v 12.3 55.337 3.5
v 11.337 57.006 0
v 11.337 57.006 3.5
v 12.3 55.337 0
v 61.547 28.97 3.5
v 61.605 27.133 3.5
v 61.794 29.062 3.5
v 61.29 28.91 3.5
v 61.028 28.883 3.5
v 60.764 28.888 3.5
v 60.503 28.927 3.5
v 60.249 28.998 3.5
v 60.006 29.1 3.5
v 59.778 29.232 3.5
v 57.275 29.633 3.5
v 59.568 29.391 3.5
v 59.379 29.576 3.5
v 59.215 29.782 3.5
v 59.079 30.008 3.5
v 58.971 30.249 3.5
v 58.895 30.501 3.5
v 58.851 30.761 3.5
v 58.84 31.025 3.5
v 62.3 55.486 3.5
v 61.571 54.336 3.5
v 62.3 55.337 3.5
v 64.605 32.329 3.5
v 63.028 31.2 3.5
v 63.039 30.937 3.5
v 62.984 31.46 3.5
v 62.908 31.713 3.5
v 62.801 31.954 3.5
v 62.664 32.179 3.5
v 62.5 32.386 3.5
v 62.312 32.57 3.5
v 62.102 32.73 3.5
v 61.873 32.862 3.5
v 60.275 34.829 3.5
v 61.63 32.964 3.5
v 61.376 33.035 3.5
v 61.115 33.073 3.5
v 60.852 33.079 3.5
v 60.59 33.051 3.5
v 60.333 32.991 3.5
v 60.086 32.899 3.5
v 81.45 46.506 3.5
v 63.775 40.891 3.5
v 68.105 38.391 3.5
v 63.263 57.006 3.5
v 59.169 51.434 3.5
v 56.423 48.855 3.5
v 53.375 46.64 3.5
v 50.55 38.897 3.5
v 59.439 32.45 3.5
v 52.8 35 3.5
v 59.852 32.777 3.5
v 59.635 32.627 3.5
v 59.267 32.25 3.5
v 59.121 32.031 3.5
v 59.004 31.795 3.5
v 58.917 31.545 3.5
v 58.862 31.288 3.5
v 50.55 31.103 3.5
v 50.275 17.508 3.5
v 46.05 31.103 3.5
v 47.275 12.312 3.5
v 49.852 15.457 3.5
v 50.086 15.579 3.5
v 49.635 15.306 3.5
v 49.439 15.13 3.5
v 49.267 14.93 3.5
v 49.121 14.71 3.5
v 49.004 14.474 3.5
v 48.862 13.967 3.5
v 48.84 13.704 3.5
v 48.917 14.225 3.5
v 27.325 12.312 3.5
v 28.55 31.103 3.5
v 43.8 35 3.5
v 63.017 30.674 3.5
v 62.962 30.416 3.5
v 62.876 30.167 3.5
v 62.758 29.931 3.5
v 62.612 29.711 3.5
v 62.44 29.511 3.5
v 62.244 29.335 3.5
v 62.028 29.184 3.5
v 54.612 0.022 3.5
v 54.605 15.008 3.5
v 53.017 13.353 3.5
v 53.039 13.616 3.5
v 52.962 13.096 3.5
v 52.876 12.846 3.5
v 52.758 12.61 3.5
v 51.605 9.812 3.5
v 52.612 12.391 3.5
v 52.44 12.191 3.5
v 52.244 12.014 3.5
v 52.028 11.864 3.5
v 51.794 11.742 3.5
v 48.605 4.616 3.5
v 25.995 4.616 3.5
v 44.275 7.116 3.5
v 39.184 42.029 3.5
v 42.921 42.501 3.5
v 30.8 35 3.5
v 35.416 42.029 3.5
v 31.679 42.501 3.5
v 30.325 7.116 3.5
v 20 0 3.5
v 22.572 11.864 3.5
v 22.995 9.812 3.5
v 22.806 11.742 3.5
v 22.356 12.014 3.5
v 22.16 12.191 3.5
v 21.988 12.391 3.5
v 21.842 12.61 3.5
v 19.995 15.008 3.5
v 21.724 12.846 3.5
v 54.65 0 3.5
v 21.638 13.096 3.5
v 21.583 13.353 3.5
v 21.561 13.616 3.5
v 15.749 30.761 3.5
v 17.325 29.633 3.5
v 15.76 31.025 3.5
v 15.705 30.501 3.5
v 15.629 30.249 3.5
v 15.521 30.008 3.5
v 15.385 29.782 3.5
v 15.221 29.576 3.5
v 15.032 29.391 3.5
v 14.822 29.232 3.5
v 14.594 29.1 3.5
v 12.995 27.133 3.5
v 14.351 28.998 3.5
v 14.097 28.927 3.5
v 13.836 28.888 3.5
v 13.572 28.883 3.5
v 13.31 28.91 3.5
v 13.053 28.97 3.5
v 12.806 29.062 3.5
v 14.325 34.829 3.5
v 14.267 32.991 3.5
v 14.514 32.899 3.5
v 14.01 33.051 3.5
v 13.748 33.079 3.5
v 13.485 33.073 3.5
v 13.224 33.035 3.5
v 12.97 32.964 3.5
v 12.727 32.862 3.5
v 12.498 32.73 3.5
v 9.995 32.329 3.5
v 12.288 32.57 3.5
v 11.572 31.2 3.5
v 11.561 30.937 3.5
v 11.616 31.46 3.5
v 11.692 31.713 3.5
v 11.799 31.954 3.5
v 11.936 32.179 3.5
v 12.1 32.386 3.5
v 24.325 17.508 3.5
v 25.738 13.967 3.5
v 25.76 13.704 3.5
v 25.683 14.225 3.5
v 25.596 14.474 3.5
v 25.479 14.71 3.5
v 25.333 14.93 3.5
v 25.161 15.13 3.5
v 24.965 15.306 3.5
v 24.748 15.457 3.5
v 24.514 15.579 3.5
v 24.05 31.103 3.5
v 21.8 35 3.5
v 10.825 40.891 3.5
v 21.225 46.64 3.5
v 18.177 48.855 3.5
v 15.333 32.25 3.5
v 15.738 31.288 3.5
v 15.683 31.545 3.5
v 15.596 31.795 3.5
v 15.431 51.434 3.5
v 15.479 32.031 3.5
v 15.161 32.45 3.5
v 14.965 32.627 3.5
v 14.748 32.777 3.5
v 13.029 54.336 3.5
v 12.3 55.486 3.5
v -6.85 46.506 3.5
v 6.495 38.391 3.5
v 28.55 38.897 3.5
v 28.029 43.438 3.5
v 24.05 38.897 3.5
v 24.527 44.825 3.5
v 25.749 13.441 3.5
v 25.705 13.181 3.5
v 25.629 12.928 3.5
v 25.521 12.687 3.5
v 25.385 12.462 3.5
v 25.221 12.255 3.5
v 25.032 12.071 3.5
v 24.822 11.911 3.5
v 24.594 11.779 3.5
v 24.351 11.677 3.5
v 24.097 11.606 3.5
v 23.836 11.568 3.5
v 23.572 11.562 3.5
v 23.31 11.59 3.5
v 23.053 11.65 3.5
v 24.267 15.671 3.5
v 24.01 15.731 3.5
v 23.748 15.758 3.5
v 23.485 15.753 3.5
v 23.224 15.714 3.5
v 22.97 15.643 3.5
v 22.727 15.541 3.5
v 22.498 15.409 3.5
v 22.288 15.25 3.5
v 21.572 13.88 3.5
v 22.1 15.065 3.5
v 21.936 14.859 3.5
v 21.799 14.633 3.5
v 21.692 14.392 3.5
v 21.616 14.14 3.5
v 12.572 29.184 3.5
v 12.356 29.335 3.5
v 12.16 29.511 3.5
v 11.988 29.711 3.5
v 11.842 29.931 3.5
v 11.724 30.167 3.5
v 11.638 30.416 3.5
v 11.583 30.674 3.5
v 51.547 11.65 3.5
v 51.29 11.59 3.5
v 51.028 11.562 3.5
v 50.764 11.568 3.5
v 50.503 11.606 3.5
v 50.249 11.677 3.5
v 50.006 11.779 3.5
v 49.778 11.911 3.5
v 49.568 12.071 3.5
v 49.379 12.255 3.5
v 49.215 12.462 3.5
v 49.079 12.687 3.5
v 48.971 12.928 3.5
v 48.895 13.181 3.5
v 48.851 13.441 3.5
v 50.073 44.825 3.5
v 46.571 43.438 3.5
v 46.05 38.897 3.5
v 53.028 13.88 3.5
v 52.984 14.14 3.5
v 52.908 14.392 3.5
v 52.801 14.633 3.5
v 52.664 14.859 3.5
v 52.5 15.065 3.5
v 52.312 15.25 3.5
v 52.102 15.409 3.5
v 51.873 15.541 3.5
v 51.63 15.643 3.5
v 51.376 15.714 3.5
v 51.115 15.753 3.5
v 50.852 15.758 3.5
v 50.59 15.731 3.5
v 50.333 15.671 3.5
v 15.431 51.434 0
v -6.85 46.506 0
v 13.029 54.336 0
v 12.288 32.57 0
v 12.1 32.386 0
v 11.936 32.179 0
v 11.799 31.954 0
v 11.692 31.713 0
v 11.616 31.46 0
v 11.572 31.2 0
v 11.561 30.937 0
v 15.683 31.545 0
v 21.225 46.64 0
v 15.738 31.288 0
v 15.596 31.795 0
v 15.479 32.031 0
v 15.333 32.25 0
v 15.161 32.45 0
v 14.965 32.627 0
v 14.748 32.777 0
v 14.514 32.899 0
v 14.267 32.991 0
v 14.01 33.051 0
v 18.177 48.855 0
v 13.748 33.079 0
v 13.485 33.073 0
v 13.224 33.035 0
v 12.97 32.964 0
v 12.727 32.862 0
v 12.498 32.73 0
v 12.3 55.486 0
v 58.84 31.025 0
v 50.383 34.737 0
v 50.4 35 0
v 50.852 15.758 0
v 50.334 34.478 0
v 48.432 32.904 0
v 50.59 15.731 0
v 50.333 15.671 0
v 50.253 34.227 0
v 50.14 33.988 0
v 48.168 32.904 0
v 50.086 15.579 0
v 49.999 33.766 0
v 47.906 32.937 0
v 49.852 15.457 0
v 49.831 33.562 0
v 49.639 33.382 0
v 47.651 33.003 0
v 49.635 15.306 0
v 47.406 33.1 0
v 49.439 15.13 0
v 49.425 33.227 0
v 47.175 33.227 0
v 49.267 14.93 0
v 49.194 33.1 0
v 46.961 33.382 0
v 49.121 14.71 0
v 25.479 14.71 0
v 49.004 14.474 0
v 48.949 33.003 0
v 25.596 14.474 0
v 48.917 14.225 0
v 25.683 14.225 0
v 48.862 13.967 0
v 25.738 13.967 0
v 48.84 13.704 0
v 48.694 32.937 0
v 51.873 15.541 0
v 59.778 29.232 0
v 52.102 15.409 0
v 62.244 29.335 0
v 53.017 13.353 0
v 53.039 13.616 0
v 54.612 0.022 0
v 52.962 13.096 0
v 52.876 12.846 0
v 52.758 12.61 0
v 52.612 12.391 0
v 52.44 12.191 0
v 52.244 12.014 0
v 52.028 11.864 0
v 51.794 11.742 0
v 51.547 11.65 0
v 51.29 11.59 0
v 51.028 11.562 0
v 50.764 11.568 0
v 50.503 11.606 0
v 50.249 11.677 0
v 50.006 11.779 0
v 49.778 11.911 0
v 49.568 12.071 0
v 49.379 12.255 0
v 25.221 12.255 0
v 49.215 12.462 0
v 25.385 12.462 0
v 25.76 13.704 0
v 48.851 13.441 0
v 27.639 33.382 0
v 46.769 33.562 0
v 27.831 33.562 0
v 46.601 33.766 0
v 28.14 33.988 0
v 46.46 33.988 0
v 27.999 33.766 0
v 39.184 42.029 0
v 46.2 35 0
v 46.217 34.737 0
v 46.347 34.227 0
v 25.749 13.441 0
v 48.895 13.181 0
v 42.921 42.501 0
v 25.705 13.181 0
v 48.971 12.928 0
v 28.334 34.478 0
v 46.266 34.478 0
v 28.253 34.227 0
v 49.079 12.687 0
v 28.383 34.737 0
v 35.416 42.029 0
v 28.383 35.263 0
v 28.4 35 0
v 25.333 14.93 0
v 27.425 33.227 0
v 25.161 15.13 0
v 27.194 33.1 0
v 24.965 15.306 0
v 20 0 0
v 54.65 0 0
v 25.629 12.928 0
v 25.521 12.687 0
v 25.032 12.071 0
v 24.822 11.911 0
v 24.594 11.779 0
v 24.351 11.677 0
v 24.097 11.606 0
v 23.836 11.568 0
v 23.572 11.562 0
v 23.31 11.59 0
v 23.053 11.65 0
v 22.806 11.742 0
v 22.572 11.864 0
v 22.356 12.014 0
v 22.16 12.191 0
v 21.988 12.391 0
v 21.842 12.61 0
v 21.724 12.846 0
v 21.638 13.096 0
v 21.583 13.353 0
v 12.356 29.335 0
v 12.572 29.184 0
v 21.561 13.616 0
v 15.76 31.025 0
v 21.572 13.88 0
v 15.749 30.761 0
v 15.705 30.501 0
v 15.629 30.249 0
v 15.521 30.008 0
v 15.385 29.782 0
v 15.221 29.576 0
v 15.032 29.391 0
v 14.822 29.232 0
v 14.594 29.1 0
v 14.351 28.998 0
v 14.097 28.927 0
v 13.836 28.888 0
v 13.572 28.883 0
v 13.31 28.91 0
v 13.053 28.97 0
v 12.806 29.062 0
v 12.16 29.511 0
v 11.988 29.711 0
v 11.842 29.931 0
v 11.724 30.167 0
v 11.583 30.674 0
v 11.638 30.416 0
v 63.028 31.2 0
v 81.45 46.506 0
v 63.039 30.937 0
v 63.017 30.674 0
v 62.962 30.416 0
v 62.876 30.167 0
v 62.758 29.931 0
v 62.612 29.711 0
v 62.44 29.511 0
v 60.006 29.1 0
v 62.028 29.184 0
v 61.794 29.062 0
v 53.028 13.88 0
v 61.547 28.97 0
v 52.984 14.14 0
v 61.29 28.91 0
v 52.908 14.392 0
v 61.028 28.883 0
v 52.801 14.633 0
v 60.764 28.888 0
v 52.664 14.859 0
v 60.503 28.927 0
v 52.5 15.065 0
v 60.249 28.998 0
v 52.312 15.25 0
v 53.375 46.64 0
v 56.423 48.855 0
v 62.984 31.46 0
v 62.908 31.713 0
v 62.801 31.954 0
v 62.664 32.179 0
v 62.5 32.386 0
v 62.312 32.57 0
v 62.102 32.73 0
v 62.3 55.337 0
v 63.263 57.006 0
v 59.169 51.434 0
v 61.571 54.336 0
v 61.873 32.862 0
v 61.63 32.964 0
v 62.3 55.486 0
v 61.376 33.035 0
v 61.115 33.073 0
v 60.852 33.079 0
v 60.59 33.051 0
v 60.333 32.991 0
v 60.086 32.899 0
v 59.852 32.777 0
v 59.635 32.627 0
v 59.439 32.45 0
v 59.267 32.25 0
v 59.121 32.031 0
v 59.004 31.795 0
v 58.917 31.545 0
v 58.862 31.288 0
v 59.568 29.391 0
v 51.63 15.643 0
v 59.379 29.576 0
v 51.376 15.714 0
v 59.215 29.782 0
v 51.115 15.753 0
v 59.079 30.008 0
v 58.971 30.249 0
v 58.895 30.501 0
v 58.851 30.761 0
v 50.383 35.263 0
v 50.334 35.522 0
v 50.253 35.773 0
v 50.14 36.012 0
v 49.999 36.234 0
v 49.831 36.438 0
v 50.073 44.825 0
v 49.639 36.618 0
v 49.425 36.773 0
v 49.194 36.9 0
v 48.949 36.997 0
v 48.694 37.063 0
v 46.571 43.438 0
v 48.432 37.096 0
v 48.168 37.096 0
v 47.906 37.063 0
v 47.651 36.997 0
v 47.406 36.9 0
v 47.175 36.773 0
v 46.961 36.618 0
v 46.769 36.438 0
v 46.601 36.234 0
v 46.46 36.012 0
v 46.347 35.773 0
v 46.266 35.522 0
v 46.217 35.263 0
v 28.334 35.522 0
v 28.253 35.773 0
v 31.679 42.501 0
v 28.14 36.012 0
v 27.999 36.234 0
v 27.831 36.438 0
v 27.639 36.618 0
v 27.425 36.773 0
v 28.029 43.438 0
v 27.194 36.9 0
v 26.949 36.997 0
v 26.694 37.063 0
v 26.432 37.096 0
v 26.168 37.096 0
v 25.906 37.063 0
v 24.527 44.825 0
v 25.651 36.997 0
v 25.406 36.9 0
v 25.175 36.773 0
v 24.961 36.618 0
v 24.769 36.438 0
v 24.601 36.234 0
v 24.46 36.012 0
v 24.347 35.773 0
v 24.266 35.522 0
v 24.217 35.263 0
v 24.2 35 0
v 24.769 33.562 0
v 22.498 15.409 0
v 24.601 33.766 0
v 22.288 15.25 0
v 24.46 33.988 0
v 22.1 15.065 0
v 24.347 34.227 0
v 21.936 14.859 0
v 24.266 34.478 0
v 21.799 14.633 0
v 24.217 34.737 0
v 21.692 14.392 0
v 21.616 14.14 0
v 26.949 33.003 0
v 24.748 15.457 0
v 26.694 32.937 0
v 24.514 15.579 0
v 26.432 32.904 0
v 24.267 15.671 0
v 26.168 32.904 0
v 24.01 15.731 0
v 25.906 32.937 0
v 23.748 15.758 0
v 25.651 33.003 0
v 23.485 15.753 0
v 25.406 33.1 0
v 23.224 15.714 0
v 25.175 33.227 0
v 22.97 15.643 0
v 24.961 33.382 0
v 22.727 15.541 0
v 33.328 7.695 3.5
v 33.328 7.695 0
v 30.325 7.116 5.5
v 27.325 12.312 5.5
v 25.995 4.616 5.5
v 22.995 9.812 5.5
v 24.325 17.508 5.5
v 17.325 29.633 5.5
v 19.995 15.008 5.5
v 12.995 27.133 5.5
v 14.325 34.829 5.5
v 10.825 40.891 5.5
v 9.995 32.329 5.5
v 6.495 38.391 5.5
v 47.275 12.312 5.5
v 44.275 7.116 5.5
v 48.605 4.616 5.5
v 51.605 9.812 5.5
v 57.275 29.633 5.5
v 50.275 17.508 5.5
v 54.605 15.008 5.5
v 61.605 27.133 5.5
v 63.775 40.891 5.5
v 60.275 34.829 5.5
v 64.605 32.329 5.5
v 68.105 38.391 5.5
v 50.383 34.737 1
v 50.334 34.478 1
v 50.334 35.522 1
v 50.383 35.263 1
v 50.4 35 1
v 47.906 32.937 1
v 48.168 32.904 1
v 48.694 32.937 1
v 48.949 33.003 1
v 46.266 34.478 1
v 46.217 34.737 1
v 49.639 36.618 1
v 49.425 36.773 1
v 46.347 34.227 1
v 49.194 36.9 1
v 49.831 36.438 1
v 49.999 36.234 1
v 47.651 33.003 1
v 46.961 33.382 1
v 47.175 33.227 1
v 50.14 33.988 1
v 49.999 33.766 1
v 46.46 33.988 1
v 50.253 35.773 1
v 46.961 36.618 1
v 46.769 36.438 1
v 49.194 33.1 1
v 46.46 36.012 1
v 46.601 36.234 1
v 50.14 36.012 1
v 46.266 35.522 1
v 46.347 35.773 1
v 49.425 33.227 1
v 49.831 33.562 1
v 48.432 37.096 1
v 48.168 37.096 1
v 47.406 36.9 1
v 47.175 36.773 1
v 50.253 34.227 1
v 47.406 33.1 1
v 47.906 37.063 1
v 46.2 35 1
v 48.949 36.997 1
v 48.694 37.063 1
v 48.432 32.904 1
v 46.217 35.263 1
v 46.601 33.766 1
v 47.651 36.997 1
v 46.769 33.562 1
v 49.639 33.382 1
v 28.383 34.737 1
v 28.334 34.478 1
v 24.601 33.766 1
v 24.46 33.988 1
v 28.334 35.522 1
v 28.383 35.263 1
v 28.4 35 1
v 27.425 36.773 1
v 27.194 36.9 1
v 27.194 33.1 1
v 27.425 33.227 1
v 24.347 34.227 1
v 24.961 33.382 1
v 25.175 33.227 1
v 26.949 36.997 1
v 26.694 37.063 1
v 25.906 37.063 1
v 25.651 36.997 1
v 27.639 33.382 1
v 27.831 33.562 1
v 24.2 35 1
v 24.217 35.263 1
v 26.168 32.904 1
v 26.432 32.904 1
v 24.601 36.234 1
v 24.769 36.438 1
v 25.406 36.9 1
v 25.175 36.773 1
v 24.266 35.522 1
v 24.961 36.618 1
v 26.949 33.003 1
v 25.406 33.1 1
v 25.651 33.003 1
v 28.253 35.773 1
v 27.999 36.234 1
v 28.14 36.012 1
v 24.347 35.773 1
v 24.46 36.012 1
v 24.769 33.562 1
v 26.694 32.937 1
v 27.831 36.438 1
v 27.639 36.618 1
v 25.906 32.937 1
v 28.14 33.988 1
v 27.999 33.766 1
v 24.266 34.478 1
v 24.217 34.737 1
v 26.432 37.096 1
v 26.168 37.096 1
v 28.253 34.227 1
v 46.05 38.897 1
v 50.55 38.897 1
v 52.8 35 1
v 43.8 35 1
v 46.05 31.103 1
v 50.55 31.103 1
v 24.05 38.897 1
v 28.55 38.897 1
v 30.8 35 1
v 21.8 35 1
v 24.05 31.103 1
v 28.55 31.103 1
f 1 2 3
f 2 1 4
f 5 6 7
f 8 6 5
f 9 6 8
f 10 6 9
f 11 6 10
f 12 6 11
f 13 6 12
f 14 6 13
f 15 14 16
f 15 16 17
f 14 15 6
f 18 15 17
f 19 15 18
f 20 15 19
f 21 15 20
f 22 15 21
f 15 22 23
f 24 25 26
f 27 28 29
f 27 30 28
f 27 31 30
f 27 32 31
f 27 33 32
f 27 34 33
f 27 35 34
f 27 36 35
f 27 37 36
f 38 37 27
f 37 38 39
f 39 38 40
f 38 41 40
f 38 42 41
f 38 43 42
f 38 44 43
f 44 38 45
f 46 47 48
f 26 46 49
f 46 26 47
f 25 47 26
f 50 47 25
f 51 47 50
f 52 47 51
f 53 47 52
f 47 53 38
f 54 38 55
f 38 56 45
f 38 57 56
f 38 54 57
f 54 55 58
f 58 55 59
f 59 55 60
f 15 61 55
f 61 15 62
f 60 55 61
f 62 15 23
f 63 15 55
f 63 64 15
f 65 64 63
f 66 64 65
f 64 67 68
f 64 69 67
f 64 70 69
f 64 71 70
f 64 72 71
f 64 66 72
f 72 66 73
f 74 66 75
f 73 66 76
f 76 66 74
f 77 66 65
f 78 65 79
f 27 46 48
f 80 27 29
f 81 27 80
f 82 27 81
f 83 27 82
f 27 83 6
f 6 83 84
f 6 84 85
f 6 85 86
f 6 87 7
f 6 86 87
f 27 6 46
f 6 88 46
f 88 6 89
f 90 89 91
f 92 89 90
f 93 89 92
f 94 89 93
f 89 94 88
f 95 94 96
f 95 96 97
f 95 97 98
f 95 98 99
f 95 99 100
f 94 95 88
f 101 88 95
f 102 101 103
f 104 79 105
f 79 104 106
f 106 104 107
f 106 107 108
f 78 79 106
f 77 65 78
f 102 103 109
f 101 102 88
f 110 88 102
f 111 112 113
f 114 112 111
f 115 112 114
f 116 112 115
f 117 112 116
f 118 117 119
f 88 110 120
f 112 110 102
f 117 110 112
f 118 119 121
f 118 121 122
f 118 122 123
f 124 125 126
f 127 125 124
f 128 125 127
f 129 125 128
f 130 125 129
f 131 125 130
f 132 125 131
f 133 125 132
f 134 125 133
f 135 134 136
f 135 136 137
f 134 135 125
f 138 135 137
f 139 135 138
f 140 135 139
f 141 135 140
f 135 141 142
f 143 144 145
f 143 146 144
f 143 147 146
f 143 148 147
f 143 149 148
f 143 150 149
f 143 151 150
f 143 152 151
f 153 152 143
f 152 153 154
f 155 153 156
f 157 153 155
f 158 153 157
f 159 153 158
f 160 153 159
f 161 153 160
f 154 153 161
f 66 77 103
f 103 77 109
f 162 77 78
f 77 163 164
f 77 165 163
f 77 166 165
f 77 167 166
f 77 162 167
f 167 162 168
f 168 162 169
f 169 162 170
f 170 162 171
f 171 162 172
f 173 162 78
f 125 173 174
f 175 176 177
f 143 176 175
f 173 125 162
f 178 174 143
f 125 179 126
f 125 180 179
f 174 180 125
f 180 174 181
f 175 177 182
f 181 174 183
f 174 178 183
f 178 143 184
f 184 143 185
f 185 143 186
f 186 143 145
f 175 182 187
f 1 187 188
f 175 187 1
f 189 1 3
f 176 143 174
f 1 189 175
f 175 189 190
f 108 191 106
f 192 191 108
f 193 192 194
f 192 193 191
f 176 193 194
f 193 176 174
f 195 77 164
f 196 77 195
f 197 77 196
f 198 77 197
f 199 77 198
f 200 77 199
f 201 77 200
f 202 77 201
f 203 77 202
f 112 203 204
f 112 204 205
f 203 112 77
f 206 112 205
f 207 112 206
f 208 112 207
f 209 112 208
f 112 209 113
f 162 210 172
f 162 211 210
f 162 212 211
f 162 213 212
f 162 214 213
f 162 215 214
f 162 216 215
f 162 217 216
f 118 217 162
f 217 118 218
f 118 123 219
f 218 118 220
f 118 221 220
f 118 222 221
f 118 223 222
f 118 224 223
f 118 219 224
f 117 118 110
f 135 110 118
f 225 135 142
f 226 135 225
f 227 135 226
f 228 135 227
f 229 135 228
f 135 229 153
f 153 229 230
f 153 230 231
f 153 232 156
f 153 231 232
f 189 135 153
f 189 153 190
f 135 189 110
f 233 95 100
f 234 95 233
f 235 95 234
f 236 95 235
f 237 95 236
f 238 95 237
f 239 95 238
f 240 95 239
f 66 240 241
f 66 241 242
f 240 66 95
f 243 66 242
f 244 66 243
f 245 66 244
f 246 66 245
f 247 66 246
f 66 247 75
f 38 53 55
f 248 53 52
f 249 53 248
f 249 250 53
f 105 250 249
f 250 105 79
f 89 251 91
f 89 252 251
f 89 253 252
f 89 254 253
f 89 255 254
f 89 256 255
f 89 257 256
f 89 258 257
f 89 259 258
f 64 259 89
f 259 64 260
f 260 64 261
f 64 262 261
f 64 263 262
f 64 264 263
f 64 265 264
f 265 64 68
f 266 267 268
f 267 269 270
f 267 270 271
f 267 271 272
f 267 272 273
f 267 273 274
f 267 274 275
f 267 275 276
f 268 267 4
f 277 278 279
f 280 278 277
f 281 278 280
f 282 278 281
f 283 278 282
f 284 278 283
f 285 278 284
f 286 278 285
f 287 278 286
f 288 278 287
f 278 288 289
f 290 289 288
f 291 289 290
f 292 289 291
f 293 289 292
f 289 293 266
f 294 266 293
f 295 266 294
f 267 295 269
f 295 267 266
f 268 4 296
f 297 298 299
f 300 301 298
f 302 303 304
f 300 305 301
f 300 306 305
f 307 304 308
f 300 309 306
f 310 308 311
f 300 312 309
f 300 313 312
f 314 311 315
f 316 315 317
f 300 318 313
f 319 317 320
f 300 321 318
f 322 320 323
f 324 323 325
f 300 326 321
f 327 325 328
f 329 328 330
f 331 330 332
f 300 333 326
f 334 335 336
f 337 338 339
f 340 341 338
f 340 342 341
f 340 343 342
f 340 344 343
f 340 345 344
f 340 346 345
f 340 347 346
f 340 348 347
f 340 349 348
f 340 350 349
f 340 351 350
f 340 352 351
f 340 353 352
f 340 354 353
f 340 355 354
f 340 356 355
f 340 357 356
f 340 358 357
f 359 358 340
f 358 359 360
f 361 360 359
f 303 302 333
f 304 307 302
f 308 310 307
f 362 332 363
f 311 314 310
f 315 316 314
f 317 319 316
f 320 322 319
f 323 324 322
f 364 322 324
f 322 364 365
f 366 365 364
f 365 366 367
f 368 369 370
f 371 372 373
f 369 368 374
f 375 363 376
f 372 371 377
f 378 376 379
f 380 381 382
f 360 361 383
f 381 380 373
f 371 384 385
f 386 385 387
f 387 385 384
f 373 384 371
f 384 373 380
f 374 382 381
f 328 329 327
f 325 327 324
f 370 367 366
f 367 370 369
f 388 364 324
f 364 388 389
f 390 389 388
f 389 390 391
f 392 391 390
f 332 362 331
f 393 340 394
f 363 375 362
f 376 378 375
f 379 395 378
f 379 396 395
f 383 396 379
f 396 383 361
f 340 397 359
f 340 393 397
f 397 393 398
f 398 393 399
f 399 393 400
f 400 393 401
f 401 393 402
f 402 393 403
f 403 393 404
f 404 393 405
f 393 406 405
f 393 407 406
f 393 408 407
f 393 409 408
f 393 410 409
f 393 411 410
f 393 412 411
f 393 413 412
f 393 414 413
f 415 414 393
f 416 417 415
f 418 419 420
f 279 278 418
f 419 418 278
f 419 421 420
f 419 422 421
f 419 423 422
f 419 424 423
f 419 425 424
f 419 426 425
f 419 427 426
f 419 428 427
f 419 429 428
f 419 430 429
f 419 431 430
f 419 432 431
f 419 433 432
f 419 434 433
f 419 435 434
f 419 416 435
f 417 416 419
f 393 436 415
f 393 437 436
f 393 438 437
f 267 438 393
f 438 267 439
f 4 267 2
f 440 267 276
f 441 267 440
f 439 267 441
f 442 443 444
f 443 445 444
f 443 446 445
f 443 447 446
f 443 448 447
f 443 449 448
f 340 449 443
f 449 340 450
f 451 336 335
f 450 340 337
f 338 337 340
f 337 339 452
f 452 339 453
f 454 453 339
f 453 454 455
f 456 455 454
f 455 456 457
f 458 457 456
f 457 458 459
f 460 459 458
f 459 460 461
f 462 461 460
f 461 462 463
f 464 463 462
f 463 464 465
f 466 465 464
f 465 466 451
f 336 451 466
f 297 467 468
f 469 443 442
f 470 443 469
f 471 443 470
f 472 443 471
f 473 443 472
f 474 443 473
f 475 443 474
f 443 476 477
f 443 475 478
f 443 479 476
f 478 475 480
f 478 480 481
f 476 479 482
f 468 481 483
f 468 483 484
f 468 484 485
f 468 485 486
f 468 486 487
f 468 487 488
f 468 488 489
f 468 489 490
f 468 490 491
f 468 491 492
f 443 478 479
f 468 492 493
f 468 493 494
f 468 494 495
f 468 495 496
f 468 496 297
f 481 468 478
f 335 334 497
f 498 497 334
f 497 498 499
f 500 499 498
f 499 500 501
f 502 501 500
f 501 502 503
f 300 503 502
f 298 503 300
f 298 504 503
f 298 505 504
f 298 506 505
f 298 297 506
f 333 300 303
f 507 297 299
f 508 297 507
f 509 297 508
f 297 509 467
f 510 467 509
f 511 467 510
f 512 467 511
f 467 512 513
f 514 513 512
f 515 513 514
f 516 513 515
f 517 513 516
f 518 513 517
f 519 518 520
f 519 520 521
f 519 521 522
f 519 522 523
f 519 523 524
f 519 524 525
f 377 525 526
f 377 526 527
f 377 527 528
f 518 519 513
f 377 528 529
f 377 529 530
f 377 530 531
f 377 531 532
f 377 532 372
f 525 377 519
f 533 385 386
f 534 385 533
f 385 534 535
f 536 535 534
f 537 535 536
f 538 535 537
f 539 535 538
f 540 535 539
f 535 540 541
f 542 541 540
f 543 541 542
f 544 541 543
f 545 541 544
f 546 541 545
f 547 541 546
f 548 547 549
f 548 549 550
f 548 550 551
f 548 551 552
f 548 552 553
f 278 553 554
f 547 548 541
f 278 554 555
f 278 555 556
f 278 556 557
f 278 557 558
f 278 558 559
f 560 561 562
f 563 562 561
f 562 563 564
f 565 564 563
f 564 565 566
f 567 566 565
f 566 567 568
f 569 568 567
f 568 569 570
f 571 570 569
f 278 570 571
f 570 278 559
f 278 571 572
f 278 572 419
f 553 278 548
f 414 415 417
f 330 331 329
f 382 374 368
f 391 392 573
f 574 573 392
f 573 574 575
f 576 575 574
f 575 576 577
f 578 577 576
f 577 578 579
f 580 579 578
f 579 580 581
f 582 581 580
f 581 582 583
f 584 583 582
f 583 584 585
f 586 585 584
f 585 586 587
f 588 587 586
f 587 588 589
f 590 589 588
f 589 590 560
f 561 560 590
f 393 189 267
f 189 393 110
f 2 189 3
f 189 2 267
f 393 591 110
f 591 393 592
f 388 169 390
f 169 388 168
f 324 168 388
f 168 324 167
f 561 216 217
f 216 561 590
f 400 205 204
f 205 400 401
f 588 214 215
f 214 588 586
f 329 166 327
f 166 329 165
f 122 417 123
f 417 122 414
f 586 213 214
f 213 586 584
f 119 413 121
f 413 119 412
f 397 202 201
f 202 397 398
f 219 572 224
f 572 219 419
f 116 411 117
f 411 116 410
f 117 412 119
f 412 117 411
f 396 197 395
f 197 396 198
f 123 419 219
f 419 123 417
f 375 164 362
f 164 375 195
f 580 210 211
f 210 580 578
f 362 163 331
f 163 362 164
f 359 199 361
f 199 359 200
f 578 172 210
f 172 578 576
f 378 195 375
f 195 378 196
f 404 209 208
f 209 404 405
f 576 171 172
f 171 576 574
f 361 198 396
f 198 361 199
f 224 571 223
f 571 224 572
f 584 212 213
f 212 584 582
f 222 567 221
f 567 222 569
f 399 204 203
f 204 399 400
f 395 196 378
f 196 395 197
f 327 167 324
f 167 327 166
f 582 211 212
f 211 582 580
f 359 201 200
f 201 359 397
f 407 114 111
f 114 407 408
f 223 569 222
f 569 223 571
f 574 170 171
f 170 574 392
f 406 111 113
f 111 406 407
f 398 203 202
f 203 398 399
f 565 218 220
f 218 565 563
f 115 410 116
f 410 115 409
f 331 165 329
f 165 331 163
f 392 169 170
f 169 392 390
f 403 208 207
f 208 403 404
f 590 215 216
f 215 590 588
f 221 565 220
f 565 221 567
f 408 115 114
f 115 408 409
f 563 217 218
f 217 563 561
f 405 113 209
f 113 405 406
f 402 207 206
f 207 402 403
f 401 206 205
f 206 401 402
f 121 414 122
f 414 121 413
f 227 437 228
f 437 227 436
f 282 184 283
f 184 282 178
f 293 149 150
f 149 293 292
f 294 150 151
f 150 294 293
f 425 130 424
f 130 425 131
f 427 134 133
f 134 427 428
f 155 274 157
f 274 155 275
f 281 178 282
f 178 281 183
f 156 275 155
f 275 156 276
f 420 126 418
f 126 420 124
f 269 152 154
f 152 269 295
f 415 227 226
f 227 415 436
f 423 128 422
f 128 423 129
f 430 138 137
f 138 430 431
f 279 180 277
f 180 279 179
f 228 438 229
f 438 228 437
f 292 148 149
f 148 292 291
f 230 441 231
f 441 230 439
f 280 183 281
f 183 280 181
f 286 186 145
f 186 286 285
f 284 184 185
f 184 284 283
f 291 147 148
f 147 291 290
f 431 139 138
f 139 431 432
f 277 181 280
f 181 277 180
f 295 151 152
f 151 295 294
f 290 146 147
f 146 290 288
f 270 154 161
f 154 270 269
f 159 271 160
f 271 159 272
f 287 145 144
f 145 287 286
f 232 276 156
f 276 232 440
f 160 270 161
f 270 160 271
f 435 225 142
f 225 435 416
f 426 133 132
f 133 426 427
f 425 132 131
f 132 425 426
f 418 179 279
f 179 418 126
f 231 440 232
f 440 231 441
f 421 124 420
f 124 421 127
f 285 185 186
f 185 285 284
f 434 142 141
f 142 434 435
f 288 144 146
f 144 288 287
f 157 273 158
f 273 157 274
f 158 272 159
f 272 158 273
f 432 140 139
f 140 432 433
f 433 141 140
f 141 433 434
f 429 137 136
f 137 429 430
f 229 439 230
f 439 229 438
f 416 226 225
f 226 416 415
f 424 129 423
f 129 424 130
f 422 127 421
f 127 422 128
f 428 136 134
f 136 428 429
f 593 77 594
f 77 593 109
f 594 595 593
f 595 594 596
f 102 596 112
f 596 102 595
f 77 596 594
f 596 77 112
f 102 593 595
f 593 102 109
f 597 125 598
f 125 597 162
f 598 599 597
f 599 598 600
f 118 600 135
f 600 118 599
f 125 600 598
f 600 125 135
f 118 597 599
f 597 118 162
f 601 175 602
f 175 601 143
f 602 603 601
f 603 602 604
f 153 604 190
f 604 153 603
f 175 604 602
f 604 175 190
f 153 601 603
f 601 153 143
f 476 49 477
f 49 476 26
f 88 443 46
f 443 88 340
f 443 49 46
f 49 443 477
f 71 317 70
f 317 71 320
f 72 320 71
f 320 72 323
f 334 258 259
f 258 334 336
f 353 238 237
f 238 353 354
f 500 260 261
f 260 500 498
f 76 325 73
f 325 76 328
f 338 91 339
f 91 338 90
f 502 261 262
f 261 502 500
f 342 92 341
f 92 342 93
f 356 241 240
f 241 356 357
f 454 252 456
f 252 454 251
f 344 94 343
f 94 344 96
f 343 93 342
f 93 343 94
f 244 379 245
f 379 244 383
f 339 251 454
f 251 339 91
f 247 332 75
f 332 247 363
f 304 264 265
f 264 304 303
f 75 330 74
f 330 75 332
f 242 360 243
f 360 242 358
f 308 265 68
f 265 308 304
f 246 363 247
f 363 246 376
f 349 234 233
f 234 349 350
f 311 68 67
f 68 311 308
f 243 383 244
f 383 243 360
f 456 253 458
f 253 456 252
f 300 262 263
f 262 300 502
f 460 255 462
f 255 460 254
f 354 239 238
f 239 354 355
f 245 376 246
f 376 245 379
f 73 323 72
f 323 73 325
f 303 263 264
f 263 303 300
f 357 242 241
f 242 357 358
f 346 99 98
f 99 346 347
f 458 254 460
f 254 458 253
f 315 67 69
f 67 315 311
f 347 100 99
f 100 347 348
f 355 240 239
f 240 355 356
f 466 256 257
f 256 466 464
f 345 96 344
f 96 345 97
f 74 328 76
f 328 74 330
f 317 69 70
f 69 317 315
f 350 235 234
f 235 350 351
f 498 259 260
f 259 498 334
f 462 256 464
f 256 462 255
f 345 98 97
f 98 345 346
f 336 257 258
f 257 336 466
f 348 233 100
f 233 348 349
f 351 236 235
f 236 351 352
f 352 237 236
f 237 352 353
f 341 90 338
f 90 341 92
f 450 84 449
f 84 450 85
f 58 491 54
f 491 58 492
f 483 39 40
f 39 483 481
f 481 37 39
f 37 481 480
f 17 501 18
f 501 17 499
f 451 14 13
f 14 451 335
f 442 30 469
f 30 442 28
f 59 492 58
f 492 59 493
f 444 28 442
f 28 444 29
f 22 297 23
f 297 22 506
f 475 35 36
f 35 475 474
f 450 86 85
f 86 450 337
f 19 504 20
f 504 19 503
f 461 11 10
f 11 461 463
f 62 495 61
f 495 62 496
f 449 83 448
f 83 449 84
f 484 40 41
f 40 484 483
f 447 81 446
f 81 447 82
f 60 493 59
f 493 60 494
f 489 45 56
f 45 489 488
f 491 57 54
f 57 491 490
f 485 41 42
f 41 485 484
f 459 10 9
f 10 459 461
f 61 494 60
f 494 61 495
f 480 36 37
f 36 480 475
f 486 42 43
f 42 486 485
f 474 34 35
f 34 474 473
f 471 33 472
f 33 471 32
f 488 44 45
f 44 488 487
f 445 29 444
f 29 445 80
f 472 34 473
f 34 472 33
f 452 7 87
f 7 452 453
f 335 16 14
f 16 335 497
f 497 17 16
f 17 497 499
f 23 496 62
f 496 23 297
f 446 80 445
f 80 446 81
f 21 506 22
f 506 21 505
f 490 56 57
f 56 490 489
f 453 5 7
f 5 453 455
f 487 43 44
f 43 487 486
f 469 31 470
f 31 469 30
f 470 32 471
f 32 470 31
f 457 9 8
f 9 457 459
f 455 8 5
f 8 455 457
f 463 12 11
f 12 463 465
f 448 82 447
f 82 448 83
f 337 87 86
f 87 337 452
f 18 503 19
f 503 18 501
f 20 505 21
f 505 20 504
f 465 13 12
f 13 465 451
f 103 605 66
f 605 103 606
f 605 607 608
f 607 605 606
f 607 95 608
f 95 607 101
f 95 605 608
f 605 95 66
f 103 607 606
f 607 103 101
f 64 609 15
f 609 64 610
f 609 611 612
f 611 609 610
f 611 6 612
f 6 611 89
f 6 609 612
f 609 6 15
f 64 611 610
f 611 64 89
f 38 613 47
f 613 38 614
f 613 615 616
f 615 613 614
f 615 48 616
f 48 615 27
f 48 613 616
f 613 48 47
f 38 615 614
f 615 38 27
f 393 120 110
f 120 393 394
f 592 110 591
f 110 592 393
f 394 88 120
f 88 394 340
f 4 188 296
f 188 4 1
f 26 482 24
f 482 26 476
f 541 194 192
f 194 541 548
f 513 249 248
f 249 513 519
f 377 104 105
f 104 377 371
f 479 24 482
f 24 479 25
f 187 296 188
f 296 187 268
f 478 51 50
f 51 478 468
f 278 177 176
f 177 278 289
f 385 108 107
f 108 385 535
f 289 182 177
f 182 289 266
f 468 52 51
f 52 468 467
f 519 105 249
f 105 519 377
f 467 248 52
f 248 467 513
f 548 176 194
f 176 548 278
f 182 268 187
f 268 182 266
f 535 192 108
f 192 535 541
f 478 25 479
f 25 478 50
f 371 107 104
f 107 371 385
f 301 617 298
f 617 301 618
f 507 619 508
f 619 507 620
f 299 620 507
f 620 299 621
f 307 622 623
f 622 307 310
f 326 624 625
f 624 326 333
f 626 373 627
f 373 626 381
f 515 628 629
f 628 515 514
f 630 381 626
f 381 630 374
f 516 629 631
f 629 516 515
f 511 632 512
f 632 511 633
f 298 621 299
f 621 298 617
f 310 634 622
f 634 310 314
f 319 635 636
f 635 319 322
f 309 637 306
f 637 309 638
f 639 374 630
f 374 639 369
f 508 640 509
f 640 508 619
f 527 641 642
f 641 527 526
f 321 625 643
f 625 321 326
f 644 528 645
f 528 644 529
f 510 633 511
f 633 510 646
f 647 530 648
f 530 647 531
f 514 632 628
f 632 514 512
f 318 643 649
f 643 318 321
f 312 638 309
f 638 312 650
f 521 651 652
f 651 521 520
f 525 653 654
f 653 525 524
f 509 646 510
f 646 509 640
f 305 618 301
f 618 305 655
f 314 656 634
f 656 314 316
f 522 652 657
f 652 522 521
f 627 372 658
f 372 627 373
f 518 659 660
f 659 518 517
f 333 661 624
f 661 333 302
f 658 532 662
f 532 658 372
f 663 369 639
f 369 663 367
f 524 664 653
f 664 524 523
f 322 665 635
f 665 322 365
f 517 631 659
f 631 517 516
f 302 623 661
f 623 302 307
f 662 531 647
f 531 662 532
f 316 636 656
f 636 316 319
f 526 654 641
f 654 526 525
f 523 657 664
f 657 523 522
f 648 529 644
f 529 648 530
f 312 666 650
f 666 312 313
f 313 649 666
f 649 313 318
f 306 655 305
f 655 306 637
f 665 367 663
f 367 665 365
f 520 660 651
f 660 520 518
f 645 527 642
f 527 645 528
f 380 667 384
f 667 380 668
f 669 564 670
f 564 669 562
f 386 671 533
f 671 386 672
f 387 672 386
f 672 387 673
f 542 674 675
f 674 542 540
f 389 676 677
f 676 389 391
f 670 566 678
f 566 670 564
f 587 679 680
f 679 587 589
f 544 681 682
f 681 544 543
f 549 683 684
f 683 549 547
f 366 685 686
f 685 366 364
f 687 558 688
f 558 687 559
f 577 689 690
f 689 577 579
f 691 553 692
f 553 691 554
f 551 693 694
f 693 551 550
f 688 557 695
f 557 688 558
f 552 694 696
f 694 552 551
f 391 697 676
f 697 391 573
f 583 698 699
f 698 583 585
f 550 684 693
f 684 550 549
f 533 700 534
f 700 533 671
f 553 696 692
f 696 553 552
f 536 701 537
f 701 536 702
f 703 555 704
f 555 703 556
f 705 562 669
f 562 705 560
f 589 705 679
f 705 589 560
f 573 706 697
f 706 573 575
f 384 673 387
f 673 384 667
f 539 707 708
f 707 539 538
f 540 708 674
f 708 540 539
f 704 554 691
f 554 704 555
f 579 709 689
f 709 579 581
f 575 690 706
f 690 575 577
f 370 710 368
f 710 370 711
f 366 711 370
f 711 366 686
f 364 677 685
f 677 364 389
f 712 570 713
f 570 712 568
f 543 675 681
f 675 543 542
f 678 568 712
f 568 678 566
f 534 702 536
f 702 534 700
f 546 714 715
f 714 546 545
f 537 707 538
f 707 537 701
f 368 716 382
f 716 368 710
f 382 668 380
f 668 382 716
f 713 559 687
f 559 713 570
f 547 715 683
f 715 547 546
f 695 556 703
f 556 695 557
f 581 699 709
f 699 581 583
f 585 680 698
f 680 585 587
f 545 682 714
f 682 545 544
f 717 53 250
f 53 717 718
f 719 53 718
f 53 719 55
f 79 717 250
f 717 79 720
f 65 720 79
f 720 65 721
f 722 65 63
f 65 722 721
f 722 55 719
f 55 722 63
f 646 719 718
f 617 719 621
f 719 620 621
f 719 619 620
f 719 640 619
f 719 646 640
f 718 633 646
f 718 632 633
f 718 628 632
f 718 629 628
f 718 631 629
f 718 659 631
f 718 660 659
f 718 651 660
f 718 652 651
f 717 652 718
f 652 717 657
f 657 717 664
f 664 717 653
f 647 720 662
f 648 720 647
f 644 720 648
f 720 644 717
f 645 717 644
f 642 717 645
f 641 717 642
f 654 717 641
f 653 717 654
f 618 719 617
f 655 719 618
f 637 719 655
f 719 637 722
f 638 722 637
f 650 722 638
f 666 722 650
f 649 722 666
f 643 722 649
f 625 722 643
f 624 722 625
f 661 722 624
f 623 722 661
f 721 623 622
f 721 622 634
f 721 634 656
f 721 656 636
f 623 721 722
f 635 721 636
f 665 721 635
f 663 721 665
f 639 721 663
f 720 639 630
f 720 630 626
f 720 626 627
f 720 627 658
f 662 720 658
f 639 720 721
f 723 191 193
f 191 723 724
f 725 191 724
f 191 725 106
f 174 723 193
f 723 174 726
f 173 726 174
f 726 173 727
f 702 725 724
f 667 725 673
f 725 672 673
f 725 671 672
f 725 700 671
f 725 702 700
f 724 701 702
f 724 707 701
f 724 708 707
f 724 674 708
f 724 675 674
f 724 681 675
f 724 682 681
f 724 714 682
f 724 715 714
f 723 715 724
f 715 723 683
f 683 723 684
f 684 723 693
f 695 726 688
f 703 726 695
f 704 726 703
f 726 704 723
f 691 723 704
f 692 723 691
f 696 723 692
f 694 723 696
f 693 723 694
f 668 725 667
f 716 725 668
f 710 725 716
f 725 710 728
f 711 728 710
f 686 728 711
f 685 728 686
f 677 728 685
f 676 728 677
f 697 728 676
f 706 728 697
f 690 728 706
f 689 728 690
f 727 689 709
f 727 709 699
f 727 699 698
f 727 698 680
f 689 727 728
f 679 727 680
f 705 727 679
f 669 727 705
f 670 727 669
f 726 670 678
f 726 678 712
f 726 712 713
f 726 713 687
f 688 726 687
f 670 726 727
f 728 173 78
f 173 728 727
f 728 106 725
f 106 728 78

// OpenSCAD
// file: functions.scad
// PRUSA Mendel  
// Functions used in many files
// GNU GPL v2
// Josef Průša
// josefprusa@me.com
// prusadjs.cz
// http://www.reprap.org/wiki/Prusa_Mendel
// http://github.com/prusajr/PrusaMendel

module nut(d,h,horizontal=true){
cornerdiameter =  (d / 2) / cos (180 / 6);
cylinder(h = h, r = cornerdiameter, $fn = 6);
if(horizontal){
for(i = [1:6]){
	rotate([0,0,60*i]) translate([-cornerdiameter-0.2,0,0]) rotate([0,0,-45]) cube(size = [2,2,h]);
}}
}

// By nophead
module polyhole(d,h) {
    n = max(round(2 * d),3);
    rotate([0,0,180])
        cylinder(h = h, r = (d / 2) / cos (180 / n), $fn = n);
}

module roundcorner(diameter){
	difference(){
		cube(size = [diameter,diameter,99], center = false);
		translate(v = [diameter, diameter, 0]) cylinder(h = 100, r=diameter, center=true);
	}
}
// file: metric.scad
// PRUSA Mendel  
// Default metric sizes
// GNU GPL v2
// Josef Průša
// josefprusa@me.com
// prusadjs.cz
// http://www.reprap.org/wiki/Prusa_Mendel
// http://github.com/prusajr/PrusaMendel

// DONT CHANGE THIS FILE! ALTER VALUES IN CONFIGURATION.SCAD INSTEAD

// RODS

threaded_rod_diameter = 8;
threaded_rod_diameter_horizontal = 8;
smooth_bar_diameter = 8;
smooth_bar_diameter_horizontal = 8;

// Nuts and bolts

m8_diameter = 8;
m8_nut_diameter = 14.5;

m4_diameter = 4;
m4_nut_diameter = 7.5;

m3_diameter = 3;
m3_nut_diameter = 5;

// Bushing holder

bushing_core_diameter = smooth_bar_diameter;
bushing_material_thickness = 1;

// Motors

motor_shaft = 5.1;
// file: configuration.scad
// PRUSA Mendel  
// Configuration file
// GNU GPL v2
// Josef Průša
// josefprusa@me.com
// prusadjs.cz
// http://www.reprap.org/wiki/Prusa_Mendel
// http://github.com/prusajr/PrusaMendel

// PLEASE SELECT ONE OF THE CONFIGURATIONS BELOW
// BY UN-COMMENTING IT

// Uncomment for metric settings
// METRIC METRIC METRIC METRIC METRIC METRIC METRIC METRIC 

include <metric.scad>;

// Uncomment for imperial settings
// IMPERIAL IMPERIAL IMPERIAL IMPERIAL IMPERIAL IMPERIAL IMPERIAL 

//include <sae.scad>;

//thin_wall = 3;
// LM8UU
//linear = false;

// override settings by customizing below
// CUSTOM CUSTOM CUSTOM CUSTOM CUSTOM CUSTOM CUSTOM CUSTOM CUSTOM

threaded_rod_diameter = 8.2;
threaded_rod_diameter_horizontal = 8.2;
smooth_bar_diameter = 8.3;
smooth_bar_diameter_horizontal = 8.3;

// Nuts and bolts

m8_diameter = 8.3;
m8_nut_diameter = 15;

m4_diameter = 4.2;
m4_nut_diameter = 9;

m3_diameter = 3.3;
m3_nut_diameter = 5.8;

///counted stuff
m3_nut_diameter_bigger = ((m3_nut_diameter  / 2) / cos (180 / 6))*2;

// functions 
include <functions.scad>
// main file
// C. Strang
// F. Beachler, Longevity Software LLC. d.b.a. Terawatt Industries

include <configuration.scad>;

$fn=50;

a = 30;								// parts angle
partthickness = 3.5;			// part thickness
screwdia = m4_diameter;		// hole diameter (i.e m3, m4, m5=5.1)
slottabs = 2;					// slot tab depth (2 normal, -1 remove)
o = 0.01;							// overlay for error free STLs

prism60end_spacer(slottabs,screwdia,partthickness);



module prism60end_spacer(sl,sc,pa)
{
	difference() {
	union() {
		translate([20,0,0]) rotate([0,0,a]) rail(sl,sc,pa);
		translate([54.60,0,0]) rotate([0,0,-a]) mirror([1,0,0]) rail(sl,sc,pa);
		translate([20,0,0]) rotate([0,0,0]) base1(pa);
		translate([57.3,44.65,0]) rotate([0,0,180]) base2(pa);
	}
	// m3 screw holes
	translate([0, 10, 0]) {
		translate([57.3 - 20 + 11, 25, -o]) cylinder(r = m4_diameter / 2, h=pa + 5);
		translate([57.3 - 20 - 11, 25, -o]) cylinder(r = m4_diameter / 2, h=pa + 5);
		// captive nuts
		translate([57.3 - 20 + 11, 25, 1]) cylinder(r = m4_nut_diameter / 2, h=pa, $fn = 6);
		translate([57.3 - 20 - 11, 25, 1]) cylinder(r = m4_nut_diameter / 2, h=pa, $fn = 6);
		}
	}
}

module base1(th)
{
	difference()
	{
		cube([34.65,13,th]);
		translate([0,0,-o]) rotate([0,0,a]) cube([34.65,13,th+(2*o)]);
		translate([34.65,0,-o]) rotate([0,0,(90-a)]) cube([13,34.65,th+2*o]);
	}
}

module base2(th)
{
	difference()
	{
		translate([-5, -15, 0]) cube([50.0, 55, th]);
		translate([-10, -10, -o]) rotate([0,0,61]) cube([60, 25, th+2*o]);
		translate([50.0, -10, -o]) rotate([0,0,29]) cube([25, 60, th+2*o]);
		translate([20.0,-27.32,-o]) rotate([0,0,0]) cylinder(r=30,h=th+2*o,$fn=50);
	}
}


module rail(st,sd,th)
{
	difference()
	{
		cube([21, 53.7, th]);
		translate([10,10,-o]) cylinder(r=sd/2,h=2*o+th);
 		translate([10,30,-o]) cylinder(r=sd/2,h=2*o+th);
	}
	translate([7.5,1,th-o]) cube([5,6.0,st+o]);
	translate([7.5,13,th-o]) cube([5,14,st+o]);
	translate([7.5,33,th-o]) cube([5,7,st+o]);

}

 
